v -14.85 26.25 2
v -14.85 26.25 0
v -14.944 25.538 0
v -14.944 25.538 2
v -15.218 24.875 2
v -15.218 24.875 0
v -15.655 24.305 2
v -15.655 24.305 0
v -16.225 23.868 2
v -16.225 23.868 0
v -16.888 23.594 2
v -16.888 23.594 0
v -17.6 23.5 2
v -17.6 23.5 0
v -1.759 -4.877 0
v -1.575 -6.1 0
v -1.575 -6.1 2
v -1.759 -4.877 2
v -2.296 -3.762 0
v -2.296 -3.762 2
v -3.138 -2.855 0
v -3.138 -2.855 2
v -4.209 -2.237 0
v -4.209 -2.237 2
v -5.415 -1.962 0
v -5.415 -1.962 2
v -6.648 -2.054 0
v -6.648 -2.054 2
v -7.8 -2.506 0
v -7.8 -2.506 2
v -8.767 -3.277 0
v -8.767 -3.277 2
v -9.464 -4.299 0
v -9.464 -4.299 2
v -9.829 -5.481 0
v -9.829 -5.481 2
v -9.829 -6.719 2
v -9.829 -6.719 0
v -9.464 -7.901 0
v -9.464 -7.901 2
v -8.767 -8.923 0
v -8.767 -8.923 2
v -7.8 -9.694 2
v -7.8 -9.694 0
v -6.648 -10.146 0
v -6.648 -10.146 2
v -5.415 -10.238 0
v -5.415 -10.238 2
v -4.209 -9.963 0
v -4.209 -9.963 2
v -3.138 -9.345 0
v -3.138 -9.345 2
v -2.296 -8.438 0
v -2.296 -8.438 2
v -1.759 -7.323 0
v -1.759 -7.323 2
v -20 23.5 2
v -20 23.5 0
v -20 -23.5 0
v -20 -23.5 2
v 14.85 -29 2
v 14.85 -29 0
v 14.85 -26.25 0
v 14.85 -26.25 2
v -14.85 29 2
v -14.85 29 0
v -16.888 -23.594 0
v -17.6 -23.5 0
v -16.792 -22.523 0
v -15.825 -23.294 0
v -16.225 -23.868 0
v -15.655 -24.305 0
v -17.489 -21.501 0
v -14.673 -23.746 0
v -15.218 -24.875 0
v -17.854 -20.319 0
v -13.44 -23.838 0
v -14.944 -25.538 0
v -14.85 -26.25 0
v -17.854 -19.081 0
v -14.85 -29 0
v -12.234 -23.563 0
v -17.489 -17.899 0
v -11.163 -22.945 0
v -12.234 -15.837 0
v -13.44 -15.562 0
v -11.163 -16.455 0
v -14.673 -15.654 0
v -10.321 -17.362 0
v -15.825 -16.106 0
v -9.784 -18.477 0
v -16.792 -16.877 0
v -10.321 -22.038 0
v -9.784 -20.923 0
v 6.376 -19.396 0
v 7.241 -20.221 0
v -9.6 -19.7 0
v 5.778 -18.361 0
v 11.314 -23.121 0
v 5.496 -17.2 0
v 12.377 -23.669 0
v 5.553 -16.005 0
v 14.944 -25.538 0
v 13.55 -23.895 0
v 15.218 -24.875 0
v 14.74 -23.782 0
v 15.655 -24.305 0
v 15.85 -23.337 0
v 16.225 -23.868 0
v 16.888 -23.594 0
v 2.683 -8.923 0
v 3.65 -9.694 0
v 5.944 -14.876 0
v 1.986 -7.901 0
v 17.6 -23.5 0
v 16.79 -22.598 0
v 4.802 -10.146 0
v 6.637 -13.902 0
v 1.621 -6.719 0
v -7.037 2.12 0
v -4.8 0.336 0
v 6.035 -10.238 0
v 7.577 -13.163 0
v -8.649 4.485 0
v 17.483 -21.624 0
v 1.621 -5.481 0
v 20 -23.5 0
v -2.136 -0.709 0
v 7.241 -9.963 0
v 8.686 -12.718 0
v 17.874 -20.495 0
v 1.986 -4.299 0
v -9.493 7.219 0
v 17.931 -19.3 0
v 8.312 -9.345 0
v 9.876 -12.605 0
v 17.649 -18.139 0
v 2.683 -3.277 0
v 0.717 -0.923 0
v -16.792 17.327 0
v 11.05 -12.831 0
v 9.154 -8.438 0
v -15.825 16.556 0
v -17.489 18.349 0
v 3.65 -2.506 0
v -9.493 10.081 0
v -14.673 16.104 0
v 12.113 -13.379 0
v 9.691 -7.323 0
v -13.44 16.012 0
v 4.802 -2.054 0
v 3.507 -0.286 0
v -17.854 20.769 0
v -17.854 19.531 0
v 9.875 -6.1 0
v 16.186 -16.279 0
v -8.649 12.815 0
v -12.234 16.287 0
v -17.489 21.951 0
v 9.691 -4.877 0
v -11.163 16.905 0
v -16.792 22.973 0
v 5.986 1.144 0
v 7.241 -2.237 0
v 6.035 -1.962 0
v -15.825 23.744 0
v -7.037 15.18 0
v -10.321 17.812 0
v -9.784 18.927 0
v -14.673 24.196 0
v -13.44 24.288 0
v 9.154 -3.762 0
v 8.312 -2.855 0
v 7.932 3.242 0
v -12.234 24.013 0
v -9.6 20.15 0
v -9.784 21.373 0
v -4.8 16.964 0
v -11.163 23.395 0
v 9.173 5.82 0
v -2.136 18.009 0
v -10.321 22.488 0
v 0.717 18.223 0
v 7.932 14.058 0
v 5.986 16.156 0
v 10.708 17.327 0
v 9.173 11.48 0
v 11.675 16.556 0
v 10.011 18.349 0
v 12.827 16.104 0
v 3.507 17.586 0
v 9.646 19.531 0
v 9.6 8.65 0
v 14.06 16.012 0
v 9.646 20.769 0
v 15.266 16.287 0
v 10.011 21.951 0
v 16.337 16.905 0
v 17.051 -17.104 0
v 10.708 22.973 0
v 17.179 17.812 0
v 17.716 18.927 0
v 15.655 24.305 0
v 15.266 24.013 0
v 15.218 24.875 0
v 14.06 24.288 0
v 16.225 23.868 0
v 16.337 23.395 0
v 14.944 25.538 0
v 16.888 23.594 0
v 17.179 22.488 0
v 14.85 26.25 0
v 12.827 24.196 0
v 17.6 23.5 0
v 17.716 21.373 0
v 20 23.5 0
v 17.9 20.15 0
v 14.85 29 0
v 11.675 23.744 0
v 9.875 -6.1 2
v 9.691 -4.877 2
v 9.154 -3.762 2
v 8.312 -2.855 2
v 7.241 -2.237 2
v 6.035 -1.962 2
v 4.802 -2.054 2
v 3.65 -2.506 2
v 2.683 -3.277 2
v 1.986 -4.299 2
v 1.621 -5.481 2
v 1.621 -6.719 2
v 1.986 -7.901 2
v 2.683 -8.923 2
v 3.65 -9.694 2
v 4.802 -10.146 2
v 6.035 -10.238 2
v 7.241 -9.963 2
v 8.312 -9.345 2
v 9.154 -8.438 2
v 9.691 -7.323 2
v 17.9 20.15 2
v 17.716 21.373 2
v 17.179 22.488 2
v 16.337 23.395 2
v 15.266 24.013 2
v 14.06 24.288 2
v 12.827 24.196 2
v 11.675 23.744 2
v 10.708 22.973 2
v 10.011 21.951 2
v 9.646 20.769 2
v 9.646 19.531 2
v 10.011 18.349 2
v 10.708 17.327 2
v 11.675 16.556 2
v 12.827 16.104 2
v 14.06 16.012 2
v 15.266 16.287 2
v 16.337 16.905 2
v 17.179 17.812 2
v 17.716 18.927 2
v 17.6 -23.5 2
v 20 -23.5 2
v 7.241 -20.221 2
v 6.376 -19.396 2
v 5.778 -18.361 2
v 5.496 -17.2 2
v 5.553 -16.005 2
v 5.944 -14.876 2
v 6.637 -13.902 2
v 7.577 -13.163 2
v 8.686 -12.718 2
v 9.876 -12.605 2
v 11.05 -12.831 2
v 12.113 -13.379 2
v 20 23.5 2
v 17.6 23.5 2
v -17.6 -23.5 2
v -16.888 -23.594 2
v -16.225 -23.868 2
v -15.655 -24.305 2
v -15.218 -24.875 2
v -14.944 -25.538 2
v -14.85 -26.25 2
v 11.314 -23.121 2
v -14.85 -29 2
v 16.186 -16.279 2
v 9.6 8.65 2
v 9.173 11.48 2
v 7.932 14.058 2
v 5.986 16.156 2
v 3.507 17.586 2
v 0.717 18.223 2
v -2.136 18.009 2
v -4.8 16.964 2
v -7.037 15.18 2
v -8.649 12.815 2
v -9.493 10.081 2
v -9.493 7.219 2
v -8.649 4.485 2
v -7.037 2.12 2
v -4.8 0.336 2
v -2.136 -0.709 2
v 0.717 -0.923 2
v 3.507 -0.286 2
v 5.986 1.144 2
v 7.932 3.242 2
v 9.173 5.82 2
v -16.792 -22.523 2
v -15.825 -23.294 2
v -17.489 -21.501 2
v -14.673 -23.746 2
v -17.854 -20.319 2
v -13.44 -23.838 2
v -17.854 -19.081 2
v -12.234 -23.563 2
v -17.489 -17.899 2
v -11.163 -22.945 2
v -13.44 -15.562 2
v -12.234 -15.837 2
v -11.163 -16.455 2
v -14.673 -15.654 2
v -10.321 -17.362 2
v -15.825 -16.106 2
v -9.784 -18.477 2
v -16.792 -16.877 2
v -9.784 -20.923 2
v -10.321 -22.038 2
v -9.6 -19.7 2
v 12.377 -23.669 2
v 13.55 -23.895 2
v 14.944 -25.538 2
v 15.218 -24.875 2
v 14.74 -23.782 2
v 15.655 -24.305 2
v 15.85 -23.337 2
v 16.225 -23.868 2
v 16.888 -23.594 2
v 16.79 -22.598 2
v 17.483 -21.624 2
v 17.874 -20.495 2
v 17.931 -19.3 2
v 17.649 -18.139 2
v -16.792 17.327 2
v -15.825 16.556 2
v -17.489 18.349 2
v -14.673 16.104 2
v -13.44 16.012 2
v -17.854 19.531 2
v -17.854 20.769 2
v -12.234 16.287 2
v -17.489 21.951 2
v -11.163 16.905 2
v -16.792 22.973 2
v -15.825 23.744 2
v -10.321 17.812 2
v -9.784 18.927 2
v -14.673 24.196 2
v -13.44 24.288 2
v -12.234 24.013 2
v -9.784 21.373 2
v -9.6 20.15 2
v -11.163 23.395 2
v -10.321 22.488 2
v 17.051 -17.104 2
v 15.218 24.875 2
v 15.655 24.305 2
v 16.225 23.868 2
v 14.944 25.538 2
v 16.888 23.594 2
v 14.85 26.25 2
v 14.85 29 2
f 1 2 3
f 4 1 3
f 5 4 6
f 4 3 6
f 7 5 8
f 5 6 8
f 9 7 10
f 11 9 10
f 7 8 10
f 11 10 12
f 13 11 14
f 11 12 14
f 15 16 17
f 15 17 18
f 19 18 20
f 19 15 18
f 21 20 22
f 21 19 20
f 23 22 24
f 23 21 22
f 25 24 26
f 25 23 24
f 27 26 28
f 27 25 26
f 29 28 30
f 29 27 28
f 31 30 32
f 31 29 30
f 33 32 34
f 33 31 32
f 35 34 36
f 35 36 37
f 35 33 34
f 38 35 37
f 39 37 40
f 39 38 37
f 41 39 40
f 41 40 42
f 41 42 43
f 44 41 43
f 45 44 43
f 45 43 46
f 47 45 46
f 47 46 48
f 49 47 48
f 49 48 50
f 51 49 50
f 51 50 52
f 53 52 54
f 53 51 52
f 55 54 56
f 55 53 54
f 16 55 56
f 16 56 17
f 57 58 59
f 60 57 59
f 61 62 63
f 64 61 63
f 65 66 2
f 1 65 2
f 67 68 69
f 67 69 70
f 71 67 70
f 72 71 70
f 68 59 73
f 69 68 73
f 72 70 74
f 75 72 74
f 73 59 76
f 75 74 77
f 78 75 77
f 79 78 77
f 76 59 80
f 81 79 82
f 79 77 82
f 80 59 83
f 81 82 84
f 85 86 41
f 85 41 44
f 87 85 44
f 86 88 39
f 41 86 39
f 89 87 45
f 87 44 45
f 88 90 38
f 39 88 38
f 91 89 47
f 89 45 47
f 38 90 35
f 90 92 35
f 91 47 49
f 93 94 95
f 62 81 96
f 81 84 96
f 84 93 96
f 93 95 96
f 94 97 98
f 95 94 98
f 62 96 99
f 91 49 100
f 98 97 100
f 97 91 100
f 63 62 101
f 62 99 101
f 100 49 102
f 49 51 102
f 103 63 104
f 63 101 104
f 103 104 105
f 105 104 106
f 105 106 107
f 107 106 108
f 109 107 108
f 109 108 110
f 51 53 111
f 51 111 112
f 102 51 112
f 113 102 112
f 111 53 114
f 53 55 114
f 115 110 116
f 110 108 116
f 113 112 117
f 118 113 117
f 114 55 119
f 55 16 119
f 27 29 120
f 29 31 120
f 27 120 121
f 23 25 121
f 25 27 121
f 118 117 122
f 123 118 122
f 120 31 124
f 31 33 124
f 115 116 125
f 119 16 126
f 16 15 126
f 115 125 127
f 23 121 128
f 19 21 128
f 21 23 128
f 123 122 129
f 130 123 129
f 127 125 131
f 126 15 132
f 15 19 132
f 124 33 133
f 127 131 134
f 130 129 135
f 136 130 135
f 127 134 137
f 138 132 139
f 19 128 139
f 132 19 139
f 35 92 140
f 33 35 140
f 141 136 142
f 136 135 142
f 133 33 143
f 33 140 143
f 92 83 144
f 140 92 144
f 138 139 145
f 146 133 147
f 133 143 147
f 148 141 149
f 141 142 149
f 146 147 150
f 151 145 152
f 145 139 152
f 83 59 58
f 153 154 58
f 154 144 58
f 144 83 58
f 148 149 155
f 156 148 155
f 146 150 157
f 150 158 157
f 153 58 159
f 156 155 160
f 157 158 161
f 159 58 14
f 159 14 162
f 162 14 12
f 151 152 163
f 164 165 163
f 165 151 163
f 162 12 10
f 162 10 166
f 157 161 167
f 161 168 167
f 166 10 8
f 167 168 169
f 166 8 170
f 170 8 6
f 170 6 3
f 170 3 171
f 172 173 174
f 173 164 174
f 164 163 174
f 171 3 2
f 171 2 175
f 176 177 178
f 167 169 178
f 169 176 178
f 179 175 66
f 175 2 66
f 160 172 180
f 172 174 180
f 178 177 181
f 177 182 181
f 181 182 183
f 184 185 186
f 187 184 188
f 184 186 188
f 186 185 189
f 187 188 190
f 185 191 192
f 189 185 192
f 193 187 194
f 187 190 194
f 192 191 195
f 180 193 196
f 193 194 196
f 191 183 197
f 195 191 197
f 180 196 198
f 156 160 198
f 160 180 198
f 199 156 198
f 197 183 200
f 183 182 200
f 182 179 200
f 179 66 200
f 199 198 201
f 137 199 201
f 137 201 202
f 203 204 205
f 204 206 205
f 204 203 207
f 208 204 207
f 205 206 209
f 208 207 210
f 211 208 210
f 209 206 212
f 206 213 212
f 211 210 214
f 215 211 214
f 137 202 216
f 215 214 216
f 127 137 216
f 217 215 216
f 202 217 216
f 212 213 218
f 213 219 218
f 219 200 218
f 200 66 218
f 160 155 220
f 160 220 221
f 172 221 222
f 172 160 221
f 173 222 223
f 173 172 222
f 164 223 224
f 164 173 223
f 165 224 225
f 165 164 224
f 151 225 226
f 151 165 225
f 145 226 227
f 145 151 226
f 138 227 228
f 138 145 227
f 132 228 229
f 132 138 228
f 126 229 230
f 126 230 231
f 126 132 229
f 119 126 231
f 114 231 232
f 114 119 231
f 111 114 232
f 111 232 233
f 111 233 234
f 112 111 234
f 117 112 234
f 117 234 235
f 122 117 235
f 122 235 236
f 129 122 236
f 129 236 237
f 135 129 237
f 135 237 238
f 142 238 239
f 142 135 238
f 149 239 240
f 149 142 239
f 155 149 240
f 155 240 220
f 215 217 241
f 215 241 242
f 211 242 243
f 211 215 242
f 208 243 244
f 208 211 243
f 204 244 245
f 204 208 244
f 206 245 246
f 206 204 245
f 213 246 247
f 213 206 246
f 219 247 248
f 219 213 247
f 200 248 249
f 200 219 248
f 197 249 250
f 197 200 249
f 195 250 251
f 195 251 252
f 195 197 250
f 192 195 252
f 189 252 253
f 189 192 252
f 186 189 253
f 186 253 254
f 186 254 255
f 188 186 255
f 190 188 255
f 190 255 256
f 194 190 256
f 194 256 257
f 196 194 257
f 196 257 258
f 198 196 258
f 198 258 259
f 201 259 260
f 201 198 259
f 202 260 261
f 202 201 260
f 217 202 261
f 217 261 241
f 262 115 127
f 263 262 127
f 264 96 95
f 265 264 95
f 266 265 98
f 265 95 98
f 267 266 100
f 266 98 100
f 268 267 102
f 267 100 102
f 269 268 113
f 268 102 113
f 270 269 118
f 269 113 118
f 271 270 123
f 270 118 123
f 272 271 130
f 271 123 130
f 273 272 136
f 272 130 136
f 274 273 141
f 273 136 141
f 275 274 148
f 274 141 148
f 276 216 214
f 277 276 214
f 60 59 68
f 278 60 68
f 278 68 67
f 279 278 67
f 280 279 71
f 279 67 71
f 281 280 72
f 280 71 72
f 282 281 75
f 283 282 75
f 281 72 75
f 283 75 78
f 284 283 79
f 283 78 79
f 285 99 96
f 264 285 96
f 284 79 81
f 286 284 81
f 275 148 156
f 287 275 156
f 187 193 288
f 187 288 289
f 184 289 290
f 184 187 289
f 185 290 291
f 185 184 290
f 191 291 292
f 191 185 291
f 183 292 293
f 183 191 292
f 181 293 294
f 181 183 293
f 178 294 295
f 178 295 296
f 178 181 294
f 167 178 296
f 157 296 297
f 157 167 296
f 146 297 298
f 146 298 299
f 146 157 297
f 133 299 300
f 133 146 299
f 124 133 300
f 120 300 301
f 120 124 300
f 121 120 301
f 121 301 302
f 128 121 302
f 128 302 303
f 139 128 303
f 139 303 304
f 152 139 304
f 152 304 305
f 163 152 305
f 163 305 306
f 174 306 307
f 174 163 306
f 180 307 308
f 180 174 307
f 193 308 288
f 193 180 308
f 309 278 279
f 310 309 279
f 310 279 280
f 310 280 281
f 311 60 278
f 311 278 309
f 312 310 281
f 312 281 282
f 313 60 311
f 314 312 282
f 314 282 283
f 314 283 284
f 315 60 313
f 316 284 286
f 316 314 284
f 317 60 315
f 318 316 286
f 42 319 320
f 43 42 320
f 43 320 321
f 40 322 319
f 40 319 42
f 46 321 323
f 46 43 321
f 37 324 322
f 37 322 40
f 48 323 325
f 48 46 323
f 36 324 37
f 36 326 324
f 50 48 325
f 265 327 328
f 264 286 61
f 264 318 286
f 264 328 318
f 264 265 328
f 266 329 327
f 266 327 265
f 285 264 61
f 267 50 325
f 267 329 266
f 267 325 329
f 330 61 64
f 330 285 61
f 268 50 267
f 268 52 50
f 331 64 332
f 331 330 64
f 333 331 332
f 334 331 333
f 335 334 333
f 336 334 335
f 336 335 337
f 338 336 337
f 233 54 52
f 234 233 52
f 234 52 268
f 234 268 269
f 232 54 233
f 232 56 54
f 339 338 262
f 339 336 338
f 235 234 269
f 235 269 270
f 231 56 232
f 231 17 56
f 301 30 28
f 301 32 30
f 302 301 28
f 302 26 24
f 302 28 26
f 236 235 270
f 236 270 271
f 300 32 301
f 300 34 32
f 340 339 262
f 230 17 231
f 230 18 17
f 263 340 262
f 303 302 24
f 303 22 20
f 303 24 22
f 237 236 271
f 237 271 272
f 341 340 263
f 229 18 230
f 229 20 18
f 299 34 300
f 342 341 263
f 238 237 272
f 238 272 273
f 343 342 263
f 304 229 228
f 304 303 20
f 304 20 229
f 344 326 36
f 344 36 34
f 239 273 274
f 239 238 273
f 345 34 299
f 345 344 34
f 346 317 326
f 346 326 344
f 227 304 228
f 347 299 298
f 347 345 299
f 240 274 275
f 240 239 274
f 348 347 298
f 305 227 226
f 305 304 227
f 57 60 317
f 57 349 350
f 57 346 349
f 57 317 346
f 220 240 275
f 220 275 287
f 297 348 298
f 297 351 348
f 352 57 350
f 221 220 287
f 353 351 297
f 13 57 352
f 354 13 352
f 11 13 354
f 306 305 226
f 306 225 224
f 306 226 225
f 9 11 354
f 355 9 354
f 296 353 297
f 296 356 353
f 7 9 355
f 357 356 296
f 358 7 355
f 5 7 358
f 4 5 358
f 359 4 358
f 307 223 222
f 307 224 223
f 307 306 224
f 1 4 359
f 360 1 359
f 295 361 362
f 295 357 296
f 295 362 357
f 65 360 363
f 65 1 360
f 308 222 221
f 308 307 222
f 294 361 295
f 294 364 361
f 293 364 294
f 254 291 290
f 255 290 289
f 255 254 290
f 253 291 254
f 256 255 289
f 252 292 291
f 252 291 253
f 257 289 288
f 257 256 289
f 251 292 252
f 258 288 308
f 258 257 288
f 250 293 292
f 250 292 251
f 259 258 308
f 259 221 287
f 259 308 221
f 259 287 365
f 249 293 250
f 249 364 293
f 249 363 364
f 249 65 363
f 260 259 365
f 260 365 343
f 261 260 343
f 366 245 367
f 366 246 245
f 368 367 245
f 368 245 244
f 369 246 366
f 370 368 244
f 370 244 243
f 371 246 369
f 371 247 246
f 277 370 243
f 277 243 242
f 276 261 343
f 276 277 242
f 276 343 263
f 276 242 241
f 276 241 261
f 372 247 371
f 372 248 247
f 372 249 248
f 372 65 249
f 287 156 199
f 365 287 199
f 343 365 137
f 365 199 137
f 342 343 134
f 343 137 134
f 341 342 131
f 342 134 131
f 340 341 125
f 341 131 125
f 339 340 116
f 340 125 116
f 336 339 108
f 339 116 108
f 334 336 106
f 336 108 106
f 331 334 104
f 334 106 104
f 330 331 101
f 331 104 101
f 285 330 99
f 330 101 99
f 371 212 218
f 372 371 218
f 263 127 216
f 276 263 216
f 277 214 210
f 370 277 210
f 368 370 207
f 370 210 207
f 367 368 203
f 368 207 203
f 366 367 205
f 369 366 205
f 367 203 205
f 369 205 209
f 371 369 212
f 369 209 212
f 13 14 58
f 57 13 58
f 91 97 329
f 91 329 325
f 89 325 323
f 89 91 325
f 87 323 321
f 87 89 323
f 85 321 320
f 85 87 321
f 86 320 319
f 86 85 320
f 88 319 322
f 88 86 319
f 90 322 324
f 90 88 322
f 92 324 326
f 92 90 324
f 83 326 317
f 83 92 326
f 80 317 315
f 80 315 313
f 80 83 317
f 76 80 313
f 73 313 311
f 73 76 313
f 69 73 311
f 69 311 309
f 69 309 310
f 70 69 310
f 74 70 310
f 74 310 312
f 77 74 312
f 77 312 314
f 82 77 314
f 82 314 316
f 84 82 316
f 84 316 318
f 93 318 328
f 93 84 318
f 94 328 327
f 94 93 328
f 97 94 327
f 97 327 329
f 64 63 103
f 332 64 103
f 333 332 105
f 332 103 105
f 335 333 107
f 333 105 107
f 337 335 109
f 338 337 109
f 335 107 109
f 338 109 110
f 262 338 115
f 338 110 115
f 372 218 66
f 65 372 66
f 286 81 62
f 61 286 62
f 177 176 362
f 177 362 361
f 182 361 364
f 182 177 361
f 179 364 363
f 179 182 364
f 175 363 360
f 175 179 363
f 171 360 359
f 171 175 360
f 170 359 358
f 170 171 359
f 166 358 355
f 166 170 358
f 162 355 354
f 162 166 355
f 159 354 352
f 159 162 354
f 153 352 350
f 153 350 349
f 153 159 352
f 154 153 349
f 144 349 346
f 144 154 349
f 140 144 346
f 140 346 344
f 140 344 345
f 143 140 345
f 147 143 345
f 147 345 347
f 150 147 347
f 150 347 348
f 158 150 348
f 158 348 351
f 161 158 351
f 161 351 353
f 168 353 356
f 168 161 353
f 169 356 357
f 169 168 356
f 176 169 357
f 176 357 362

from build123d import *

# Parameters (mm, degrees)
SKETCH1_R           = 4.15
SKETCH1_R_2         = 9.6
BOSS_EXTRUDE1_DEPTH = 2


with BuildPart() as part:
    # Sketch1 → Boss-Extrude1 (new body)
    with BuildSketch(Plane.XY):
        with BuildLine():
            Line((-14.85, 29), (-14.85, 26.25))
            ThreePointArc((-14.85, 26.25), (-15.655456352, 24.305456352), (-17.6, 23.5))
            Line((-17.6, 23.5), (-20, 23.5))
            Line((-20, 23.5), (-20, -23.5))
            Line((-20, -23.5), (-17.6, -23.5))
            ThreePointArc((-17.6, -23.5), (-15.655456352, -24.305456352), (-14.85, -26.25))
            Line((-14.85, -26.25), (-14.85, -29))
            Line((-14.85, -29), (14.85, -29))
            Line((14.85, -29), (14.85, -26.25))
            ThreePointArc((14.85, -26.25), (15.655456352, -24.305456352), (17.6, -23.5))
            Line((17.6, -23.5), (20, -23.5))
            Line((20, -23.5), (20, 23.5))
            Line((20, 23.5), (17.6, 23.5))
            ThreePointArc((17.6, 23.5), (15.655456352, 24.305456352), (14.85, 26.25))
            Line((14.85, 26.25), (14.85, 29))
            Line((14.85, 29), (-14.85, 29))
        make_face()
        with Locations((-13.75, -19.7)):
            Circle(SKETCH1_R, mode=Mode.SUBTRACT)
        with Locations((-5.725, -6.1)):
            Circle(SKETCH1_R, mode=Mode.SUBTRACT)
        with BuildLine():
            ThreePointArc((16.186, -16.278610808), (17.171389192, -22.136), (11.314, -23.121389192))
            Line((11.314, -23.121389192), (7.240917629, -20.221389192))
            ThreePointArc((7.240917629, -20.221389192), (6.255528438, -14.364), (12.112917629, -13.378610808))
            Line((12.112917629, -13.378610808), (16.186, -16.278610808))
        make_face(mode=Mode.SUBTRACT)
        with Locations((5.725, -6.1)):
            Circle(SKETCH1_R, mode=Mode.SUBTRACT)
        with Locations((0, 8.65)):
            Circle(SKETCH1_R_2, mode=Mode.SUBTRACT)
        with Locations((-13.75, 20.15)):
            Circle(SKETCH1_R, mode=Mode.SUBTRACT)
        with Locations((13.75, 20.15)):
            Circle(SKETCH1_R, mode=Mode.SUBTRACT)
    extrude(amount=BOSS_EXTRUDE1_DEPTH)


solid = part.part
